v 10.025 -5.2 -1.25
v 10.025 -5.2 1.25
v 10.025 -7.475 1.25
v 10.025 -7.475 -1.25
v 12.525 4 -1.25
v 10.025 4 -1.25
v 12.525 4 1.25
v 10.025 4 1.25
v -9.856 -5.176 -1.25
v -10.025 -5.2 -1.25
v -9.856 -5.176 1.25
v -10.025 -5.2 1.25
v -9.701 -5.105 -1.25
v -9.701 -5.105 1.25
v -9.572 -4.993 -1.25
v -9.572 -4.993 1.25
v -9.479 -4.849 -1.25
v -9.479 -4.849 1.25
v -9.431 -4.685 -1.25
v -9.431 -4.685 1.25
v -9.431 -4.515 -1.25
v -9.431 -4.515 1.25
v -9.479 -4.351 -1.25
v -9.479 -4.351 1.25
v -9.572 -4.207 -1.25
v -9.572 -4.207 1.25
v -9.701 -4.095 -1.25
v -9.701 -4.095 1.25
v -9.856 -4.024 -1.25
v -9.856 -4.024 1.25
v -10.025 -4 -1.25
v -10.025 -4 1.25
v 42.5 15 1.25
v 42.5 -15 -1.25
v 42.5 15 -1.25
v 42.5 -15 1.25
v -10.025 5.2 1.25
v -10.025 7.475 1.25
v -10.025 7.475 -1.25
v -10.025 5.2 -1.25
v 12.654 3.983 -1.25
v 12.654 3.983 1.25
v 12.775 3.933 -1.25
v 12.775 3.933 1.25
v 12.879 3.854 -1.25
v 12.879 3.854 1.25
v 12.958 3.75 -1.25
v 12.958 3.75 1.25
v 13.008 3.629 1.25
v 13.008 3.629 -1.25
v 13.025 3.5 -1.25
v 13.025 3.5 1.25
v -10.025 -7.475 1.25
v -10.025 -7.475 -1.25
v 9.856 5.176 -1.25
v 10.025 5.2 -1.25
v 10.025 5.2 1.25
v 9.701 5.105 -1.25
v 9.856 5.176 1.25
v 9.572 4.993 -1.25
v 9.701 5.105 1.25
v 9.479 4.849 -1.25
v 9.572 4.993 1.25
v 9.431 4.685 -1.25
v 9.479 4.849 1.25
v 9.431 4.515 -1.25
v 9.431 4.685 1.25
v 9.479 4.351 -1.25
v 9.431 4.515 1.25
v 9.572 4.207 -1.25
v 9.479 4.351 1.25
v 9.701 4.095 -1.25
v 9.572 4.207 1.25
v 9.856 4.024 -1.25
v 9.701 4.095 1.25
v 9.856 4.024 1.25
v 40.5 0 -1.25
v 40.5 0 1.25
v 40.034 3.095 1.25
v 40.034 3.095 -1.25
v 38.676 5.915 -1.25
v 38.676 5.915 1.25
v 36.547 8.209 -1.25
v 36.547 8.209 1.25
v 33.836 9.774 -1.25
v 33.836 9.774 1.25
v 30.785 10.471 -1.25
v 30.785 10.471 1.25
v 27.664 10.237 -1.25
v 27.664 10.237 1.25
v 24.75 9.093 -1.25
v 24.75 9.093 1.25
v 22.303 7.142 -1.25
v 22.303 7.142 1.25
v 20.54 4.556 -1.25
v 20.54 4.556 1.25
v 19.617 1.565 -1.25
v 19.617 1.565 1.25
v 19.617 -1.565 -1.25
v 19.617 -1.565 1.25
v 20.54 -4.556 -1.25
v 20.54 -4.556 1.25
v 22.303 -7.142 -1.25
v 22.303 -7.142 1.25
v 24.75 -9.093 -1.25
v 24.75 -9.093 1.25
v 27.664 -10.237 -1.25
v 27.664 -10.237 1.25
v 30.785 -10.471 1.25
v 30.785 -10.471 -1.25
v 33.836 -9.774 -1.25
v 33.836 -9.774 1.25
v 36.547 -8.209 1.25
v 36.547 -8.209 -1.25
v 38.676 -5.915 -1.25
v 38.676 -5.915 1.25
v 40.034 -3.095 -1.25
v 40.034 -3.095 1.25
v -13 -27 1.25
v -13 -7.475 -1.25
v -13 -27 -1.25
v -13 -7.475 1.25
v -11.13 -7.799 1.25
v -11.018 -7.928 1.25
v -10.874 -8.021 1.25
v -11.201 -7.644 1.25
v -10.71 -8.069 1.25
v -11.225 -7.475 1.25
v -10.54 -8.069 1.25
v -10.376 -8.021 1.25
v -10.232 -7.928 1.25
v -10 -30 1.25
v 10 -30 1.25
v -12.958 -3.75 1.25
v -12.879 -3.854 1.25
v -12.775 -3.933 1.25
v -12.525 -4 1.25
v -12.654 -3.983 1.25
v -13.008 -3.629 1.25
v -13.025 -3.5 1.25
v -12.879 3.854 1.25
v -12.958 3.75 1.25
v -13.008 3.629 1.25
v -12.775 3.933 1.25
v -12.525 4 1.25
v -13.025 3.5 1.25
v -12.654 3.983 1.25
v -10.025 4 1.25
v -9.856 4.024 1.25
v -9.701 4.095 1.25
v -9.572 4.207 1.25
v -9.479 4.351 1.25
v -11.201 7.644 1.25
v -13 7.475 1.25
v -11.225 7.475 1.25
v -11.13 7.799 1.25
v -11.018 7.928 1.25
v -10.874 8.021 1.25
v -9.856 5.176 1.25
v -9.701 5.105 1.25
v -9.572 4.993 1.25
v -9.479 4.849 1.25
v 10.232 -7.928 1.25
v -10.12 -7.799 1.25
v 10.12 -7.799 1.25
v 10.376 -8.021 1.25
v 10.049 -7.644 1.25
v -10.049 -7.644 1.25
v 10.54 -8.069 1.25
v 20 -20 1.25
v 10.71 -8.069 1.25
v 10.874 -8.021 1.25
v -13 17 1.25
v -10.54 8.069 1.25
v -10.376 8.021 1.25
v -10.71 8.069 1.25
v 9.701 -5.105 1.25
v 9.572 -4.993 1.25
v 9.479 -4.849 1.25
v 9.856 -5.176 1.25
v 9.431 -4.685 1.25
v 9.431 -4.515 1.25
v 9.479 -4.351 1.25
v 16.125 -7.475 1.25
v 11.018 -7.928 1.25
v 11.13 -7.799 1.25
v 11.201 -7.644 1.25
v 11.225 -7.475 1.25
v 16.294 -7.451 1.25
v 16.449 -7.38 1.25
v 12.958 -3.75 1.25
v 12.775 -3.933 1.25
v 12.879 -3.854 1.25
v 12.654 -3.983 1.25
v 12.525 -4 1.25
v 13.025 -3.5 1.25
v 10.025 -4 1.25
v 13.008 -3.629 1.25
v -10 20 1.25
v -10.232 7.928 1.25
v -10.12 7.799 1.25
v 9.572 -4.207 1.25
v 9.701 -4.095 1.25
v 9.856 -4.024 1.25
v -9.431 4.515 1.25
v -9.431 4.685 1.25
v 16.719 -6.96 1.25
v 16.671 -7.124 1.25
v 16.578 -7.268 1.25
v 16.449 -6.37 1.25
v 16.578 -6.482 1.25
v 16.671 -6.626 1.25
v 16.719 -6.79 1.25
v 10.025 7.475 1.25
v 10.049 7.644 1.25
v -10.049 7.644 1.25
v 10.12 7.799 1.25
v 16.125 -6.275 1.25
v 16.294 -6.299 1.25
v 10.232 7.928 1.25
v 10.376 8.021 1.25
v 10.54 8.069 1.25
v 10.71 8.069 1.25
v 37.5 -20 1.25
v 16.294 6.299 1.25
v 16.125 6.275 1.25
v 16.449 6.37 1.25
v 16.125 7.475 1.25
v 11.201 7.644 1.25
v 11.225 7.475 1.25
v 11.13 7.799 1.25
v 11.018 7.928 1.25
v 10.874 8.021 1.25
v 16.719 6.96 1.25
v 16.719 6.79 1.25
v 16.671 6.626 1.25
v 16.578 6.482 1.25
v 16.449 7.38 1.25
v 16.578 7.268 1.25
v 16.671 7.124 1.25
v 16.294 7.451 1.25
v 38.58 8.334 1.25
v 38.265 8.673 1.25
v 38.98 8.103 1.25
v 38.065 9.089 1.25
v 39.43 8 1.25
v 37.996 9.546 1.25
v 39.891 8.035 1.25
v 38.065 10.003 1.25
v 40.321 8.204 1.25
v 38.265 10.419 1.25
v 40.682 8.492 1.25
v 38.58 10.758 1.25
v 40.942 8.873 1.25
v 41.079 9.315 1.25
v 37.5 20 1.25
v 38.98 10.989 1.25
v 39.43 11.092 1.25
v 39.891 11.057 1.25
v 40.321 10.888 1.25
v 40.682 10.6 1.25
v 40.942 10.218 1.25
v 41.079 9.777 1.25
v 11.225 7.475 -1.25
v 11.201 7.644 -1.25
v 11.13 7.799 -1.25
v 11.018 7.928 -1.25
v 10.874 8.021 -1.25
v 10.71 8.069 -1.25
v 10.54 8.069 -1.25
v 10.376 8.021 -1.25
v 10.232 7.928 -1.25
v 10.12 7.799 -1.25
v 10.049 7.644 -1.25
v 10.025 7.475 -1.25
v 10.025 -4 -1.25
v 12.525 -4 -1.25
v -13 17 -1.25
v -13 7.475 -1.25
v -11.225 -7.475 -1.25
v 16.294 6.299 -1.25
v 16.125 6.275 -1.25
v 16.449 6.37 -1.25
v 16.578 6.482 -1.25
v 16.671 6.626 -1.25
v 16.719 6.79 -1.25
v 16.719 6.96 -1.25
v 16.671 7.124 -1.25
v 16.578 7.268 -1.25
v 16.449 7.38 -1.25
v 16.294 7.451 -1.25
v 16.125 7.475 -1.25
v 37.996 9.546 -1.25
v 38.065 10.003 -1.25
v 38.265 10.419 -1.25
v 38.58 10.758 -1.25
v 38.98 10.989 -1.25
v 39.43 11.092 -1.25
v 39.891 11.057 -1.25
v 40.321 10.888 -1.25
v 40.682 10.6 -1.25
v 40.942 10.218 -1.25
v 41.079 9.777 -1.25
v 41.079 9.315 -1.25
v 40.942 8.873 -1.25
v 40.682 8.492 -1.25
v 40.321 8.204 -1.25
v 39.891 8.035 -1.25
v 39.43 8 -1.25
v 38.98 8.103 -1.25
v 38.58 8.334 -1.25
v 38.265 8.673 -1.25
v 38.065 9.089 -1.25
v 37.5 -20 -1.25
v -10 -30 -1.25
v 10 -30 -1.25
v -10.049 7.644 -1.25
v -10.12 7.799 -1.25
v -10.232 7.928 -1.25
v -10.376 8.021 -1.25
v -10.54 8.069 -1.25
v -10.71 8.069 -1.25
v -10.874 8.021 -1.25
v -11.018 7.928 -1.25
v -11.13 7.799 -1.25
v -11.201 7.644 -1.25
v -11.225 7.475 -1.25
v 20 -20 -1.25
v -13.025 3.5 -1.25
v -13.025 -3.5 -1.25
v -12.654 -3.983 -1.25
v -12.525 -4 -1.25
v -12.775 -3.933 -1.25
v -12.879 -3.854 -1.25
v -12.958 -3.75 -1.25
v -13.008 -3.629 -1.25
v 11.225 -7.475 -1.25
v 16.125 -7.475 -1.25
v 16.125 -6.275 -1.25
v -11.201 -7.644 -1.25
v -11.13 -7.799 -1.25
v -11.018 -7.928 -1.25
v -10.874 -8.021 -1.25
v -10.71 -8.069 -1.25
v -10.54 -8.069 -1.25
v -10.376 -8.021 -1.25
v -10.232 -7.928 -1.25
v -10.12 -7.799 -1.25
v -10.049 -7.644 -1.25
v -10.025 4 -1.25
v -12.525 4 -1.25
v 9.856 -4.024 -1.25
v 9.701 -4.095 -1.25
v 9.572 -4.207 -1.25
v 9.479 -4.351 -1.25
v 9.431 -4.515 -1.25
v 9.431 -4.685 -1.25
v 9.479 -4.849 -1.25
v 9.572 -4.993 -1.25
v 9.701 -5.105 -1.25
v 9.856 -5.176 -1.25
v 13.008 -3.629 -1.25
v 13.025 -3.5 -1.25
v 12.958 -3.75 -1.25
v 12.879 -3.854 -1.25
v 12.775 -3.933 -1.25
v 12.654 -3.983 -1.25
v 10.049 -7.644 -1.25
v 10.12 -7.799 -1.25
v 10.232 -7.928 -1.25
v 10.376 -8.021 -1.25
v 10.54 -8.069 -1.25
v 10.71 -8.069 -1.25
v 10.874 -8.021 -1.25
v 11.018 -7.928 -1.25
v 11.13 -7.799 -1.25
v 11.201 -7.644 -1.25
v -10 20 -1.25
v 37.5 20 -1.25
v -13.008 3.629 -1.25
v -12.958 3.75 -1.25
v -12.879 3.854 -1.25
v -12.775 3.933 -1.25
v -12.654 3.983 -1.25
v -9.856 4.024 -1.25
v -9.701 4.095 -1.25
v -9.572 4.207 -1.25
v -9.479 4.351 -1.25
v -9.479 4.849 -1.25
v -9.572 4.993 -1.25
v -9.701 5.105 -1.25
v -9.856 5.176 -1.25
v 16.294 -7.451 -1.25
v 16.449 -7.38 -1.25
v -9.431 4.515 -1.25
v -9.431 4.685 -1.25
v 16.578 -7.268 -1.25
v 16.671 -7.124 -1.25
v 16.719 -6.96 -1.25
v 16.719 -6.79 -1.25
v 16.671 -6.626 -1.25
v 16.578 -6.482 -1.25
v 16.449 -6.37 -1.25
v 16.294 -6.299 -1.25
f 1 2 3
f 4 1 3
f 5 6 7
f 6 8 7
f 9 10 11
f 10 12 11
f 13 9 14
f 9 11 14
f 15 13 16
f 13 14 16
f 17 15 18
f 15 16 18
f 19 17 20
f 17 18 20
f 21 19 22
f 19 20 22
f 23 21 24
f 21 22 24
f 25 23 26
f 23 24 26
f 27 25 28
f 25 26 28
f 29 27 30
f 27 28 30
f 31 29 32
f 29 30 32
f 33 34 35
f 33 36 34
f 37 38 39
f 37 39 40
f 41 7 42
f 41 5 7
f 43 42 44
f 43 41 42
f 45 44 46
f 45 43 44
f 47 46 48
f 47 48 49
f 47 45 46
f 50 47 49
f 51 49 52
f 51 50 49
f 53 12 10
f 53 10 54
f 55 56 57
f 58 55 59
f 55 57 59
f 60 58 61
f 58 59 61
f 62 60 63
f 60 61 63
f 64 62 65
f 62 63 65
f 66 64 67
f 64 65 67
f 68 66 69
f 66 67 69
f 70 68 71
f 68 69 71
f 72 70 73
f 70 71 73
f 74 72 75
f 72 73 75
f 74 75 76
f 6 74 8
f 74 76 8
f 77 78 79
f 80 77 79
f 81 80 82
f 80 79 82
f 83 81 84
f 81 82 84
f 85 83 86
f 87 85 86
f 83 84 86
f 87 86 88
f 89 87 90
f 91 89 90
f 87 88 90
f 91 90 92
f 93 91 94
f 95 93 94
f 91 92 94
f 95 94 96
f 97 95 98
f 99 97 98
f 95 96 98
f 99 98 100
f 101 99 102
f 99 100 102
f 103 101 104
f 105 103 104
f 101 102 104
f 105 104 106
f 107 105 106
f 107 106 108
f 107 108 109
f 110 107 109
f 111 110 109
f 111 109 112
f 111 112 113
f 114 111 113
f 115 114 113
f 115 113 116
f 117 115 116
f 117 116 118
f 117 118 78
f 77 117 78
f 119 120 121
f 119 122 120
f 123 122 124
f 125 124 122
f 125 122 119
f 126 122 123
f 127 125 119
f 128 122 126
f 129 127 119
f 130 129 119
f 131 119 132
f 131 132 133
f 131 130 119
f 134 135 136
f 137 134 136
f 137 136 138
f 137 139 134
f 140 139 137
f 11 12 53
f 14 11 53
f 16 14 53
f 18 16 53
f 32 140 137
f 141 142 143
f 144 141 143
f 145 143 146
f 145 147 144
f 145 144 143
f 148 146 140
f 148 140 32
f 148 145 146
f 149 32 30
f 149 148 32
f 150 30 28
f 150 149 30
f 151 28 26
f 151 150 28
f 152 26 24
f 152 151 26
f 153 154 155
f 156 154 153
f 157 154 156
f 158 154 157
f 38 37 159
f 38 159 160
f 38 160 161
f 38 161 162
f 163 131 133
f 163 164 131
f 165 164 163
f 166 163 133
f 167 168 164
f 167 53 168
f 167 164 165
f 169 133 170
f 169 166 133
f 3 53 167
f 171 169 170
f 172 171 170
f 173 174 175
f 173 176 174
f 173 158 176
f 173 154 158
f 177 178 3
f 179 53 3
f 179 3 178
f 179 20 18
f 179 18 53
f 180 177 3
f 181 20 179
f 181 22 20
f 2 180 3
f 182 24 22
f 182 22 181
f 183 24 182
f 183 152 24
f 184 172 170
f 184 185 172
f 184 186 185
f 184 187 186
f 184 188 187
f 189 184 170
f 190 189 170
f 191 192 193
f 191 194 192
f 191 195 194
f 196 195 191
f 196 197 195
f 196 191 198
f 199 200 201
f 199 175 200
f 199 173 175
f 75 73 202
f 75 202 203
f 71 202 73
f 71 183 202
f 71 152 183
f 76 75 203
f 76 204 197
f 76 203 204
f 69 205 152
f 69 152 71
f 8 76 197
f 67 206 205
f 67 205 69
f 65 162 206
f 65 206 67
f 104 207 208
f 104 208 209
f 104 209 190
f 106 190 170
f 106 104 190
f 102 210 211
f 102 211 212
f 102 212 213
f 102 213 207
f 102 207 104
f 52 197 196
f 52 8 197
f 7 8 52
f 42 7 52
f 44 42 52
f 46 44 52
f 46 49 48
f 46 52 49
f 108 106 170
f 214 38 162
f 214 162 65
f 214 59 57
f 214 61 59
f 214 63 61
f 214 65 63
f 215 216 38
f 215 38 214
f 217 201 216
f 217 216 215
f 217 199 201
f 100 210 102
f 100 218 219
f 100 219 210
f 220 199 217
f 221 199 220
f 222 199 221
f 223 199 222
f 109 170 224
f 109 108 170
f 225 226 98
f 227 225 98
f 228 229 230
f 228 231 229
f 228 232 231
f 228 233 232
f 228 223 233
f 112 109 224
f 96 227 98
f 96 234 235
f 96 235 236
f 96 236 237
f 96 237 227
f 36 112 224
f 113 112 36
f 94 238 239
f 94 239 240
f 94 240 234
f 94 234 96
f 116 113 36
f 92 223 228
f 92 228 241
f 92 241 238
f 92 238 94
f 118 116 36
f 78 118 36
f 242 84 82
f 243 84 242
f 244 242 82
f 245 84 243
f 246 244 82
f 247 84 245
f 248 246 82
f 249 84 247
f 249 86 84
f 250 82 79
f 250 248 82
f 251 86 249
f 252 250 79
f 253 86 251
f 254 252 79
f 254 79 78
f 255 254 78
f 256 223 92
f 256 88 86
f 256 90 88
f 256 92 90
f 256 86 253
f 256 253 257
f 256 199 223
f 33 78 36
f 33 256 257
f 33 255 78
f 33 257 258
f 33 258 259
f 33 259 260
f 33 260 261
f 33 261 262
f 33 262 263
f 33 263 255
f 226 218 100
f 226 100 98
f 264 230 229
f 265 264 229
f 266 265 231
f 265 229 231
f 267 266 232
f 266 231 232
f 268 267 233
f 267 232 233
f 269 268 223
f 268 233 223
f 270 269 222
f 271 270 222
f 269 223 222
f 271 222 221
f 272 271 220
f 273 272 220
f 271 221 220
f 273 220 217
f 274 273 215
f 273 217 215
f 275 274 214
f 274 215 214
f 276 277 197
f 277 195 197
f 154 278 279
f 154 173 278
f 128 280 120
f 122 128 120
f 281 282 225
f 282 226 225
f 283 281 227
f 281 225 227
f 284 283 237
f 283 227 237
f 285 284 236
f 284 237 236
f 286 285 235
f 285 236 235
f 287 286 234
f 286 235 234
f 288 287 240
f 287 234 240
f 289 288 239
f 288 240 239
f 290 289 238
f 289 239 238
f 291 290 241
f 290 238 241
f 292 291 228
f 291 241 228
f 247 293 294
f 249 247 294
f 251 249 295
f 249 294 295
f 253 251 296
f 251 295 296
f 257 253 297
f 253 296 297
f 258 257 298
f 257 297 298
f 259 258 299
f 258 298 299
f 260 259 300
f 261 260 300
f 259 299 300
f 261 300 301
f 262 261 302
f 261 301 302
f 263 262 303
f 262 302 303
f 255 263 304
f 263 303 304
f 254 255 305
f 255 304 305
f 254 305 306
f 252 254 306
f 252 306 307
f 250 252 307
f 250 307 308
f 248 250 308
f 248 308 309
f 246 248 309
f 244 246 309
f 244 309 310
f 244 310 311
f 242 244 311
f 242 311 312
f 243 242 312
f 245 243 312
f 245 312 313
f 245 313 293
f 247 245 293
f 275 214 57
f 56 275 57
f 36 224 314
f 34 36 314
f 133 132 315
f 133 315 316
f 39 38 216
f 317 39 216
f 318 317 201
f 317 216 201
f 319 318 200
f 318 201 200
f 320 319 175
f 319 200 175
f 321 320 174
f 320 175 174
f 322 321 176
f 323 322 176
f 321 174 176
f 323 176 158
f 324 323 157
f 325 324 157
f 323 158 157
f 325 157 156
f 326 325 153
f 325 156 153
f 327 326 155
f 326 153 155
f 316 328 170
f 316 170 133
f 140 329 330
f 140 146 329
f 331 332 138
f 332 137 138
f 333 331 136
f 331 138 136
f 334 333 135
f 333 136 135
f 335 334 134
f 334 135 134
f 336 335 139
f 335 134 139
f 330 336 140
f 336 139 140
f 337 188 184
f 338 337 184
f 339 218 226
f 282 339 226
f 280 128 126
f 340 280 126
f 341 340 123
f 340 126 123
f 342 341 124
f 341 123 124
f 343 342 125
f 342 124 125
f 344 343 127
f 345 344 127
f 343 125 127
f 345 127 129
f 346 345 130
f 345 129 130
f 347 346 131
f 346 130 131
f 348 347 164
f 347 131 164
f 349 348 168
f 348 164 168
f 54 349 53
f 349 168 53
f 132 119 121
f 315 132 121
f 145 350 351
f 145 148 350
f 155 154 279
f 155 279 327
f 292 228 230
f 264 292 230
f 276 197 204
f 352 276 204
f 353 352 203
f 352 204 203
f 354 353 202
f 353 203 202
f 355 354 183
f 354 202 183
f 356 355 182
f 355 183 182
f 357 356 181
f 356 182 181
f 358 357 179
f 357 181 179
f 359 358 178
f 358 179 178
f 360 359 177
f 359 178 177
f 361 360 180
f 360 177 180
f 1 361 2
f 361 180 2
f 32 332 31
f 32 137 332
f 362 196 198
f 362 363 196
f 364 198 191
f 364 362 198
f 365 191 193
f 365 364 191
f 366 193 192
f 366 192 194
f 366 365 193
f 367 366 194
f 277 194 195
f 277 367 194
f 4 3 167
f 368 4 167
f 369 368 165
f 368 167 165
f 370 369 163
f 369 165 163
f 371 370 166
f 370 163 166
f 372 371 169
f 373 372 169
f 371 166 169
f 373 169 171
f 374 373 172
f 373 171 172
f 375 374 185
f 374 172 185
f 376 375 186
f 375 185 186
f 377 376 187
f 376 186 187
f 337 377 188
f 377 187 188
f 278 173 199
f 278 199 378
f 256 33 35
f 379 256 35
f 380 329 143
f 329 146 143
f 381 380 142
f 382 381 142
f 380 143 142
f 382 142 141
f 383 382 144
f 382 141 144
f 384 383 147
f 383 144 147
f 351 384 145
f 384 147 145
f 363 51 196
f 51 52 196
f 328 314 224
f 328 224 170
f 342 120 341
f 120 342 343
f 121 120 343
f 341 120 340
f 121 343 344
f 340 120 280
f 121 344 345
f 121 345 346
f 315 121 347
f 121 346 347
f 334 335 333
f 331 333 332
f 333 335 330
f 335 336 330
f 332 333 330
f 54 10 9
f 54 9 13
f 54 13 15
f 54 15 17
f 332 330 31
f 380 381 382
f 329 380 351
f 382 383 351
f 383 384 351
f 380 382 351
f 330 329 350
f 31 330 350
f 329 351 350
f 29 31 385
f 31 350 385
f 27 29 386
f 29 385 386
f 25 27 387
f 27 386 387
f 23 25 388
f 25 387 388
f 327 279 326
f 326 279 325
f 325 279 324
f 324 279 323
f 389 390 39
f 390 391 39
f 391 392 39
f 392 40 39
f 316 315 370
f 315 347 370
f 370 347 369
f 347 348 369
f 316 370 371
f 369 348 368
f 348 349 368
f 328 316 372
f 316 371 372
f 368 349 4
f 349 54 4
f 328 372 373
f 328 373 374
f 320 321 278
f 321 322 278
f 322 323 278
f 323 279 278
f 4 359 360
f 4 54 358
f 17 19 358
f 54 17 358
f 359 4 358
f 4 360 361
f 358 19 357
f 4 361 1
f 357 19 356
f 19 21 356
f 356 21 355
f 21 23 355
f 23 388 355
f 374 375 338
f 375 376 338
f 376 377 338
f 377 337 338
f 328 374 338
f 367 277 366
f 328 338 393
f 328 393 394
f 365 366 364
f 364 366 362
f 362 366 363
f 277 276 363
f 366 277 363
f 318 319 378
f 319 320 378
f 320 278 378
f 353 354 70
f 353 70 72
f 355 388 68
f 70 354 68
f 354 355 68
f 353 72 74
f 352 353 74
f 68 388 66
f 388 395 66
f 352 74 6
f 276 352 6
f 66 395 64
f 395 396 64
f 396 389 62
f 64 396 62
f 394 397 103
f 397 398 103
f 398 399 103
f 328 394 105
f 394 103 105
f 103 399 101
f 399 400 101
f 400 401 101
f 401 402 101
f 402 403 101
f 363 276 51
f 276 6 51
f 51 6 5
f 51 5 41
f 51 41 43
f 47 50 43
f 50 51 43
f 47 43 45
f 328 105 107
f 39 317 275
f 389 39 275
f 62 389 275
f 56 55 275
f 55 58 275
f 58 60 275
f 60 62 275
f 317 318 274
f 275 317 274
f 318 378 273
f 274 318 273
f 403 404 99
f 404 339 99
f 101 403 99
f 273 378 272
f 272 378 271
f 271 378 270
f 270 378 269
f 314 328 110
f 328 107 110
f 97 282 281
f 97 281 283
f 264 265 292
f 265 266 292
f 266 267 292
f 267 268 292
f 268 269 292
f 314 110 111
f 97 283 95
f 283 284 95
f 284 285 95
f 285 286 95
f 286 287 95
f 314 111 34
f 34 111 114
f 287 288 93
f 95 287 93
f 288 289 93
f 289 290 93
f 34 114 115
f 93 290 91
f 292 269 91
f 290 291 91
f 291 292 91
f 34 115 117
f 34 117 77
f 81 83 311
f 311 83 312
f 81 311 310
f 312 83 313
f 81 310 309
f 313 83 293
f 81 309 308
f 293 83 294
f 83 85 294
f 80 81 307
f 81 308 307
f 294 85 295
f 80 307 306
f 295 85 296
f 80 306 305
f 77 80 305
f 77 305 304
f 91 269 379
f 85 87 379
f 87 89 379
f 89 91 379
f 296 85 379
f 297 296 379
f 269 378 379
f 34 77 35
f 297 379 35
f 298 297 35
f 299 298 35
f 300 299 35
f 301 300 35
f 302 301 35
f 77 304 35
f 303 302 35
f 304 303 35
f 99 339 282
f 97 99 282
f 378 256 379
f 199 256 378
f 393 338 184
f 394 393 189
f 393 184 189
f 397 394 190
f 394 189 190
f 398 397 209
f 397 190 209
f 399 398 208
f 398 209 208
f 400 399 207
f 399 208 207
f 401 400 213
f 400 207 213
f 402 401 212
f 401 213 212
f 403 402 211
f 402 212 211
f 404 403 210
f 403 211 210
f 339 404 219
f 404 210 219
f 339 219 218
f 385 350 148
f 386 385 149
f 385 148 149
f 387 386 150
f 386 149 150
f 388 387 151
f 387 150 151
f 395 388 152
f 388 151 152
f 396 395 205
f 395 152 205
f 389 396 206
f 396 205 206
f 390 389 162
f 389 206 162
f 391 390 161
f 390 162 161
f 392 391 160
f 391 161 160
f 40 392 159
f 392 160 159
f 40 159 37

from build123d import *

# Parameters (mm, degrees)
EXTRUDE_1_DEPTH     = 1.25
SKETCH_2_R          = 0.6
CUT_EXTRUDE_1_DEPTH = 3.5
FILLET_1_R          = 0.5
SKETCH_3_R          = 10.5
CUT_EXTRUDE_2_DEPTH = 3.5
CHAMFER_1_SIZE      = 5
CHAMFER_2_SIZE      = 15
CHAMFER_3_SIZE      = 3
CUT_EXTRUDE_4_DEPTH = 3.5
SKETCH_6_R          = 1.55
CUT_EXTRUDE_5_DEPTH = 3.5


with BuildPart() as part:
    # 草图1 → 凸台-拉伸1 (new body, symmetric)
    with BuildSketch(Plane.XY):
        Polygon((-13, 20), (-13, 7.475), (-10.025, 7.475), (-10.025, 4), (-13.025, 4), (-13.025, -4), (-10.025, -4), (-10.025, -7.475), (-13, -7.475), (-13, -30), (42.5, -30), (42.5, 20), align=None)
        Polygon((10.025, 7.475), (10.025, 4), (13.025, 4), (13.025, -4), (10.025, -4), (10.025, -7.475), (16.125, -7.475), (16.125, 7.475), align=None, mode=Mode.SUBTRACT)
    extrude(amount=EXTRUDE_1_DEPTH, both=True)

    # 草图2 → 切除-拉伸1 (cut, through all)
    with BuildSketch(Plane.XY.offset(1.25)):
        with Locations((10.625, 7.475)):
            Circle(SKETCH_2_R)
        with Locations((16.125, 6.875)):
            Circle(SKETCH_2_R)
        with Locations((10.025, 4.6)):
            Circle(SKETCH_2_R)
        with Locations((10.025, -4.6)):
            Circle(SKETCH_2_R)
        with Locations((10.625, -7.475)):
            Circle(SKETCH_2_R)
        with Locations((16.125, -6.875)):
            Circle(SKETCH_2_R)
        with Locations((-10.025, -4.6)):
            Circle(SKETCH_2_R)
        with Locations((-10.625, -7.475)):
            Circle(SKETCH_2_R)
        with Locations((-10.625, 7.475)):
            Circle(SKETCH_2_R)
        with Locations((-10.025, 4.6)):
            Circle(SKETCH_2_R)
    extrude(amount=-CUT_EXTRUDE_1_DEPTH, mode=Mode.SUBTRACT)

    # 圆角1
    fillet_1_edges = [part.edges().sort_by_distance(p)[0] for p in [
        (-13.025, -4, 0),
        (-13.025, 4, 0),
        (13.025, -4, 0),
        (13.025, 4, 0),
    ]]
    fillet(fillet_1_edges, radius=FILLET_1_R)

    # 草图3 → 切除-拉伸2 (cut, through all)
    with BuildSketch(Plane.XY.offset(1.25)):
        with Locations((30, 0)):
            Circle(SKETCH_3_R)
    extrude(amount=-CUT_EXTRUDE_2_DEPTH, mode=Mode.SUBTRACT)

    # 倒角1
    chamfer_1_edges = [part.edges().sort_by_distance(p)[0] for p in [
        (42.5, 20, 0),
    ]]
    chamfer(chamfer_1_edges, length=CHAMFER_1_SIZE)

    # 倒角2
    chamfer_2_edges = [part.edges().sort_by_distance(p)[0] for p in [
        (42.5, -30, 0),
    ]]
    chamfer(chamfer_2_edges, length=CHAMFER_2_SIZE)

    # 倒角3
    chamfer_3_edges = [part.edges().sort_by_distance(p)[0] for p in [
        (-13, -30, 0),
        (-13, 20, 0),
    ]]
    chamfer(chamfer_3_edges, length=CHAMFER_3_SIZE)

    # 草图5 → 切除-拉伸4 (cut, through all)
    with BuildSketch(Plane(origin=(0, 0, -1.25), x_dir=(-1, 0, 0), z_dir=(0, 0, -1))):
        Polygon((-37.5, -20), (-20, -20), (-10, -30), (-27.5, -30), align=None)
    extrude(amount=-CUT_EXTRUDE_4_DEPTH, mode=Mode.SUBTRACT)

    # 草图6 → 切除-拉伸5 (cut, through all)
    with BuildSketch(Plane(origin=(0, 0, -1.25), x_dir=(-1, 0, 0), z_dir=(0, 0, -1))):
        with Locations((-39.545941546, 9.545941546)):
            Circle(SKETCH_6_R)
    extrude(amount=-CUT_EXTRUDE_5_DEPTH, mode=Mode.SUBTRACT)


solid = part.part
